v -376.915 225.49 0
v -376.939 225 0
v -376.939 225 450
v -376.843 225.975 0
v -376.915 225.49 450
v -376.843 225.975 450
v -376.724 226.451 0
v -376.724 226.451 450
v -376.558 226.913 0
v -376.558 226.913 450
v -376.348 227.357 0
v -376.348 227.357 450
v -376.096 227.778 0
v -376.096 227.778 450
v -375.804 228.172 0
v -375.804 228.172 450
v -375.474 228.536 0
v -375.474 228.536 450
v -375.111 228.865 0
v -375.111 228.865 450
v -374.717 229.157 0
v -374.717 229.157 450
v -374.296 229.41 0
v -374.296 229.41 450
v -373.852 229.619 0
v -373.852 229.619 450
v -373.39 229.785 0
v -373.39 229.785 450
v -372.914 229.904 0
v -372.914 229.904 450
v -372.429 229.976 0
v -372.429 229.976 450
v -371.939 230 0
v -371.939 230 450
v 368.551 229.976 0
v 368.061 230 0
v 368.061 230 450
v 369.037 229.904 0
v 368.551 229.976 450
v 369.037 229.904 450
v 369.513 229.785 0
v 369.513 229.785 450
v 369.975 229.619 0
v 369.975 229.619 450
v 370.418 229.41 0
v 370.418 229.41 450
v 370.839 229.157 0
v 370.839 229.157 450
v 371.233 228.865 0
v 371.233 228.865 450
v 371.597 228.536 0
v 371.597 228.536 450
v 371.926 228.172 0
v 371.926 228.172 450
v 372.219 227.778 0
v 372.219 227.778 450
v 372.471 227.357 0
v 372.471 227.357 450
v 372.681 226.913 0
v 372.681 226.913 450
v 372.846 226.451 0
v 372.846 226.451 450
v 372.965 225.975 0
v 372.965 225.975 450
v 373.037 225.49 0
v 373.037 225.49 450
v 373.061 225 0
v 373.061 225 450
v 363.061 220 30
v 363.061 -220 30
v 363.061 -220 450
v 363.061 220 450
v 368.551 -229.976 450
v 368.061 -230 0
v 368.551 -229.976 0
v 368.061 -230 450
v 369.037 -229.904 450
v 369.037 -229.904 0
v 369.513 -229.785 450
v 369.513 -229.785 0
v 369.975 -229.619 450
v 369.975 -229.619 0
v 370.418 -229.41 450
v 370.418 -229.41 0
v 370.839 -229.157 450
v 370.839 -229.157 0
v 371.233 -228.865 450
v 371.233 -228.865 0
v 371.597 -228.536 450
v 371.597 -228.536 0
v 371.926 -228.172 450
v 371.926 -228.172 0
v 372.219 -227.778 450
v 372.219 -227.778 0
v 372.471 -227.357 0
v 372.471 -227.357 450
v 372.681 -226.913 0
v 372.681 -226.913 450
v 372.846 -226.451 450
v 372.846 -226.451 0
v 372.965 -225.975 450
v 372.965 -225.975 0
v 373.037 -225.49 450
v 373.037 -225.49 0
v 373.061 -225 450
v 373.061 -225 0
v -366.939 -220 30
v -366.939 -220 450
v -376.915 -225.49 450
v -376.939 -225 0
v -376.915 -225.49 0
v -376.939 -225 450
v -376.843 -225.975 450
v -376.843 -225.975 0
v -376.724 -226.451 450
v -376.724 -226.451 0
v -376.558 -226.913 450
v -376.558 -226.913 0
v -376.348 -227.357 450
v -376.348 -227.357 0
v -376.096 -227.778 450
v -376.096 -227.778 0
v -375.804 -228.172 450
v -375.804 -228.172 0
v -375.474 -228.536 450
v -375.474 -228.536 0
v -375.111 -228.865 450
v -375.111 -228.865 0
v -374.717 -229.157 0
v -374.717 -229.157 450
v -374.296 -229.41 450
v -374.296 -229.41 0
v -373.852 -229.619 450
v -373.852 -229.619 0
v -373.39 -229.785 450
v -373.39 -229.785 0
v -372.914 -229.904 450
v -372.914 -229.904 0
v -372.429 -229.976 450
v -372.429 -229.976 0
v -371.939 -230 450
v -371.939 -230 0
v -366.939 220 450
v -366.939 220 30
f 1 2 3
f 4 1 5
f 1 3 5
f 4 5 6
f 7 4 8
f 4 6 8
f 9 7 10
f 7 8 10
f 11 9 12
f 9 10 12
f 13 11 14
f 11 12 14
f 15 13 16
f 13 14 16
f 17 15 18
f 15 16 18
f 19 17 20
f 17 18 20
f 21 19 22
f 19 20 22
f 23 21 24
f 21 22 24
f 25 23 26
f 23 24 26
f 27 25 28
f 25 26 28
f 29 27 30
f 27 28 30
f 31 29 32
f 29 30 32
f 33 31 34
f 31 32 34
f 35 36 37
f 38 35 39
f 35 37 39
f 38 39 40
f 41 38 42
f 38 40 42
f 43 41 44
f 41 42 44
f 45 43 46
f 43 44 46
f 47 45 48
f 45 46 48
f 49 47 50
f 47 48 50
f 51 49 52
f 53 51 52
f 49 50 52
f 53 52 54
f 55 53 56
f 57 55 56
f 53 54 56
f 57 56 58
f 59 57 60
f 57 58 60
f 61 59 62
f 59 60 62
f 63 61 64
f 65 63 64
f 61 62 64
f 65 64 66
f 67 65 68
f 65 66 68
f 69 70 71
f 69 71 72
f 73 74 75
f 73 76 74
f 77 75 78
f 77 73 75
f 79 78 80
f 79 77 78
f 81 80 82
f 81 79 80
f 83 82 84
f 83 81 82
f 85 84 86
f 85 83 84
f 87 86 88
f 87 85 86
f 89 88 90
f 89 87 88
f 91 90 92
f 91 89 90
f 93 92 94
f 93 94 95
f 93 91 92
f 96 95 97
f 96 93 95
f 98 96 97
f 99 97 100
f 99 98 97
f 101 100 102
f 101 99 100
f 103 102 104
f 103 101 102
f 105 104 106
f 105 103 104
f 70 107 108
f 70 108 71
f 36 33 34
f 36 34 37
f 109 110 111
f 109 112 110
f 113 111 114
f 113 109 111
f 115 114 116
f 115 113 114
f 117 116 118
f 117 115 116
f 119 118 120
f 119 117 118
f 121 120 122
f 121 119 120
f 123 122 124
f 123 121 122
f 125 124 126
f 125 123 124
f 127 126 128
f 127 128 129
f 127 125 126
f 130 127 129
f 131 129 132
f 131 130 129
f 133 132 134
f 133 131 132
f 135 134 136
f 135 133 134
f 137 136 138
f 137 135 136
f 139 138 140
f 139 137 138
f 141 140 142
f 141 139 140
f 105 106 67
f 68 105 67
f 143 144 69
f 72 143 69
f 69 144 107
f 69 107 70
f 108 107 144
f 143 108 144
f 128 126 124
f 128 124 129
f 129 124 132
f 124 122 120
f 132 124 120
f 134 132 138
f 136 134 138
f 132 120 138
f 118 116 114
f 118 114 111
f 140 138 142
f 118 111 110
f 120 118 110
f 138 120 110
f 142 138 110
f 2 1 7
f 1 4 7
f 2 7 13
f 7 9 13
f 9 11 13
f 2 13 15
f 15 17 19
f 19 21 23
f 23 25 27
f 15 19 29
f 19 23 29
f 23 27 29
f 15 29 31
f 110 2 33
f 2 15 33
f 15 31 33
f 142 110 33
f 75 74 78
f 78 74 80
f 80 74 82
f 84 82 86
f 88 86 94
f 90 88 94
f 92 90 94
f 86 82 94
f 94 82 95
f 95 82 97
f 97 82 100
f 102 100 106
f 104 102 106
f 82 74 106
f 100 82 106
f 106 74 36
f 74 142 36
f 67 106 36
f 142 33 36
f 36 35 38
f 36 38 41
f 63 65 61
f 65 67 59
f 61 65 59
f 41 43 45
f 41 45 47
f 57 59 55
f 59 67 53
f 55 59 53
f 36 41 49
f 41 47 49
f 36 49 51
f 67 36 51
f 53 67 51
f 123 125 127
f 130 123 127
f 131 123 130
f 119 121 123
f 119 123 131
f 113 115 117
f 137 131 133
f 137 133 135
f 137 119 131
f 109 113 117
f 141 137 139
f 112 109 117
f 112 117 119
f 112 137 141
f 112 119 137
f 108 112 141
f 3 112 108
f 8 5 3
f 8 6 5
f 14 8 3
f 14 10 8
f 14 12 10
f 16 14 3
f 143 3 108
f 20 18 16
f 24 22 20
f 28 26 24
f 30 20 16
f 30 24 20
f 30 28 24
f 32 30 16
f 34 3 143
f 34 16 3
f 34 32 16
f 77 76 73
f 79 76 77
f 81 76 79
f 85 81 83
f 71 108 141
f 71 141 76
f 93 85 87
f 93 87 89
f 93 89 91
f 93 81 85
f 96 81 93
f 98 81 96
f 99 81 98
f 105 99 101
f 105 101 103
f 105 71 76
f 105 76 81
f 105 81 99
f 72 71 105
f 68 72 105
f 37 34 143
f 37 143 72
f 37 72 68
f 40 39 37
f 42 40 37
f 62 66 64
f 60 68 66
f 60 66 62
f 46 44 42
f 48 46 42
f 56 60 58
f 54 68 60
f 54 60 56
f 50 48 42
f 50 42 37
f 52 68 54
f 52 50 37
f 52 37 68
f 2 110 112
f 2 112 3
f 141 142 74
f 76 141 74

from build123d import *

# Parameters (mm, degrees)
F0_W     = 730
F0_H     = 440
F1_DEPTH = 30
F0_W_2   = 750
F0_H_2   = 460
F2_DEPTH = 450
F3_R     = 5


with BuildPart() as f1:
    # F0 (on Top) → F1 (new body)
    with BuildSketch(Plane.XY):
        with Locations((-1.938822, 0)):
            Rectangle(F0_W, F0_H)
    extrude(amount=F1_DEPTH)

    # F0 (on Top) → F2 (join)
    with BuildSketch(Plane.XY):
        with Locations((-1.938822, 0)):
            Rectangle(F0_W_2, F0_H_2)
        with Locations((-1.938822, 0)):
            Rectangle(F0_W, F0_H, mode=Mode.SUBTRACT)
    extrude(amount=F2_DEPTH)

    # F3
    f3_edges = [f1.edges().sort_by_distance(p)[0] for p in [
        (-376.938822, -230, 225),
        (373.061178, -230, 225),
        (373.061178, 230, 225),
        (-376.938822, 230, 225),
    ]]
    fillet(f3_edges, radius=F3_R)


solid = f1.part
